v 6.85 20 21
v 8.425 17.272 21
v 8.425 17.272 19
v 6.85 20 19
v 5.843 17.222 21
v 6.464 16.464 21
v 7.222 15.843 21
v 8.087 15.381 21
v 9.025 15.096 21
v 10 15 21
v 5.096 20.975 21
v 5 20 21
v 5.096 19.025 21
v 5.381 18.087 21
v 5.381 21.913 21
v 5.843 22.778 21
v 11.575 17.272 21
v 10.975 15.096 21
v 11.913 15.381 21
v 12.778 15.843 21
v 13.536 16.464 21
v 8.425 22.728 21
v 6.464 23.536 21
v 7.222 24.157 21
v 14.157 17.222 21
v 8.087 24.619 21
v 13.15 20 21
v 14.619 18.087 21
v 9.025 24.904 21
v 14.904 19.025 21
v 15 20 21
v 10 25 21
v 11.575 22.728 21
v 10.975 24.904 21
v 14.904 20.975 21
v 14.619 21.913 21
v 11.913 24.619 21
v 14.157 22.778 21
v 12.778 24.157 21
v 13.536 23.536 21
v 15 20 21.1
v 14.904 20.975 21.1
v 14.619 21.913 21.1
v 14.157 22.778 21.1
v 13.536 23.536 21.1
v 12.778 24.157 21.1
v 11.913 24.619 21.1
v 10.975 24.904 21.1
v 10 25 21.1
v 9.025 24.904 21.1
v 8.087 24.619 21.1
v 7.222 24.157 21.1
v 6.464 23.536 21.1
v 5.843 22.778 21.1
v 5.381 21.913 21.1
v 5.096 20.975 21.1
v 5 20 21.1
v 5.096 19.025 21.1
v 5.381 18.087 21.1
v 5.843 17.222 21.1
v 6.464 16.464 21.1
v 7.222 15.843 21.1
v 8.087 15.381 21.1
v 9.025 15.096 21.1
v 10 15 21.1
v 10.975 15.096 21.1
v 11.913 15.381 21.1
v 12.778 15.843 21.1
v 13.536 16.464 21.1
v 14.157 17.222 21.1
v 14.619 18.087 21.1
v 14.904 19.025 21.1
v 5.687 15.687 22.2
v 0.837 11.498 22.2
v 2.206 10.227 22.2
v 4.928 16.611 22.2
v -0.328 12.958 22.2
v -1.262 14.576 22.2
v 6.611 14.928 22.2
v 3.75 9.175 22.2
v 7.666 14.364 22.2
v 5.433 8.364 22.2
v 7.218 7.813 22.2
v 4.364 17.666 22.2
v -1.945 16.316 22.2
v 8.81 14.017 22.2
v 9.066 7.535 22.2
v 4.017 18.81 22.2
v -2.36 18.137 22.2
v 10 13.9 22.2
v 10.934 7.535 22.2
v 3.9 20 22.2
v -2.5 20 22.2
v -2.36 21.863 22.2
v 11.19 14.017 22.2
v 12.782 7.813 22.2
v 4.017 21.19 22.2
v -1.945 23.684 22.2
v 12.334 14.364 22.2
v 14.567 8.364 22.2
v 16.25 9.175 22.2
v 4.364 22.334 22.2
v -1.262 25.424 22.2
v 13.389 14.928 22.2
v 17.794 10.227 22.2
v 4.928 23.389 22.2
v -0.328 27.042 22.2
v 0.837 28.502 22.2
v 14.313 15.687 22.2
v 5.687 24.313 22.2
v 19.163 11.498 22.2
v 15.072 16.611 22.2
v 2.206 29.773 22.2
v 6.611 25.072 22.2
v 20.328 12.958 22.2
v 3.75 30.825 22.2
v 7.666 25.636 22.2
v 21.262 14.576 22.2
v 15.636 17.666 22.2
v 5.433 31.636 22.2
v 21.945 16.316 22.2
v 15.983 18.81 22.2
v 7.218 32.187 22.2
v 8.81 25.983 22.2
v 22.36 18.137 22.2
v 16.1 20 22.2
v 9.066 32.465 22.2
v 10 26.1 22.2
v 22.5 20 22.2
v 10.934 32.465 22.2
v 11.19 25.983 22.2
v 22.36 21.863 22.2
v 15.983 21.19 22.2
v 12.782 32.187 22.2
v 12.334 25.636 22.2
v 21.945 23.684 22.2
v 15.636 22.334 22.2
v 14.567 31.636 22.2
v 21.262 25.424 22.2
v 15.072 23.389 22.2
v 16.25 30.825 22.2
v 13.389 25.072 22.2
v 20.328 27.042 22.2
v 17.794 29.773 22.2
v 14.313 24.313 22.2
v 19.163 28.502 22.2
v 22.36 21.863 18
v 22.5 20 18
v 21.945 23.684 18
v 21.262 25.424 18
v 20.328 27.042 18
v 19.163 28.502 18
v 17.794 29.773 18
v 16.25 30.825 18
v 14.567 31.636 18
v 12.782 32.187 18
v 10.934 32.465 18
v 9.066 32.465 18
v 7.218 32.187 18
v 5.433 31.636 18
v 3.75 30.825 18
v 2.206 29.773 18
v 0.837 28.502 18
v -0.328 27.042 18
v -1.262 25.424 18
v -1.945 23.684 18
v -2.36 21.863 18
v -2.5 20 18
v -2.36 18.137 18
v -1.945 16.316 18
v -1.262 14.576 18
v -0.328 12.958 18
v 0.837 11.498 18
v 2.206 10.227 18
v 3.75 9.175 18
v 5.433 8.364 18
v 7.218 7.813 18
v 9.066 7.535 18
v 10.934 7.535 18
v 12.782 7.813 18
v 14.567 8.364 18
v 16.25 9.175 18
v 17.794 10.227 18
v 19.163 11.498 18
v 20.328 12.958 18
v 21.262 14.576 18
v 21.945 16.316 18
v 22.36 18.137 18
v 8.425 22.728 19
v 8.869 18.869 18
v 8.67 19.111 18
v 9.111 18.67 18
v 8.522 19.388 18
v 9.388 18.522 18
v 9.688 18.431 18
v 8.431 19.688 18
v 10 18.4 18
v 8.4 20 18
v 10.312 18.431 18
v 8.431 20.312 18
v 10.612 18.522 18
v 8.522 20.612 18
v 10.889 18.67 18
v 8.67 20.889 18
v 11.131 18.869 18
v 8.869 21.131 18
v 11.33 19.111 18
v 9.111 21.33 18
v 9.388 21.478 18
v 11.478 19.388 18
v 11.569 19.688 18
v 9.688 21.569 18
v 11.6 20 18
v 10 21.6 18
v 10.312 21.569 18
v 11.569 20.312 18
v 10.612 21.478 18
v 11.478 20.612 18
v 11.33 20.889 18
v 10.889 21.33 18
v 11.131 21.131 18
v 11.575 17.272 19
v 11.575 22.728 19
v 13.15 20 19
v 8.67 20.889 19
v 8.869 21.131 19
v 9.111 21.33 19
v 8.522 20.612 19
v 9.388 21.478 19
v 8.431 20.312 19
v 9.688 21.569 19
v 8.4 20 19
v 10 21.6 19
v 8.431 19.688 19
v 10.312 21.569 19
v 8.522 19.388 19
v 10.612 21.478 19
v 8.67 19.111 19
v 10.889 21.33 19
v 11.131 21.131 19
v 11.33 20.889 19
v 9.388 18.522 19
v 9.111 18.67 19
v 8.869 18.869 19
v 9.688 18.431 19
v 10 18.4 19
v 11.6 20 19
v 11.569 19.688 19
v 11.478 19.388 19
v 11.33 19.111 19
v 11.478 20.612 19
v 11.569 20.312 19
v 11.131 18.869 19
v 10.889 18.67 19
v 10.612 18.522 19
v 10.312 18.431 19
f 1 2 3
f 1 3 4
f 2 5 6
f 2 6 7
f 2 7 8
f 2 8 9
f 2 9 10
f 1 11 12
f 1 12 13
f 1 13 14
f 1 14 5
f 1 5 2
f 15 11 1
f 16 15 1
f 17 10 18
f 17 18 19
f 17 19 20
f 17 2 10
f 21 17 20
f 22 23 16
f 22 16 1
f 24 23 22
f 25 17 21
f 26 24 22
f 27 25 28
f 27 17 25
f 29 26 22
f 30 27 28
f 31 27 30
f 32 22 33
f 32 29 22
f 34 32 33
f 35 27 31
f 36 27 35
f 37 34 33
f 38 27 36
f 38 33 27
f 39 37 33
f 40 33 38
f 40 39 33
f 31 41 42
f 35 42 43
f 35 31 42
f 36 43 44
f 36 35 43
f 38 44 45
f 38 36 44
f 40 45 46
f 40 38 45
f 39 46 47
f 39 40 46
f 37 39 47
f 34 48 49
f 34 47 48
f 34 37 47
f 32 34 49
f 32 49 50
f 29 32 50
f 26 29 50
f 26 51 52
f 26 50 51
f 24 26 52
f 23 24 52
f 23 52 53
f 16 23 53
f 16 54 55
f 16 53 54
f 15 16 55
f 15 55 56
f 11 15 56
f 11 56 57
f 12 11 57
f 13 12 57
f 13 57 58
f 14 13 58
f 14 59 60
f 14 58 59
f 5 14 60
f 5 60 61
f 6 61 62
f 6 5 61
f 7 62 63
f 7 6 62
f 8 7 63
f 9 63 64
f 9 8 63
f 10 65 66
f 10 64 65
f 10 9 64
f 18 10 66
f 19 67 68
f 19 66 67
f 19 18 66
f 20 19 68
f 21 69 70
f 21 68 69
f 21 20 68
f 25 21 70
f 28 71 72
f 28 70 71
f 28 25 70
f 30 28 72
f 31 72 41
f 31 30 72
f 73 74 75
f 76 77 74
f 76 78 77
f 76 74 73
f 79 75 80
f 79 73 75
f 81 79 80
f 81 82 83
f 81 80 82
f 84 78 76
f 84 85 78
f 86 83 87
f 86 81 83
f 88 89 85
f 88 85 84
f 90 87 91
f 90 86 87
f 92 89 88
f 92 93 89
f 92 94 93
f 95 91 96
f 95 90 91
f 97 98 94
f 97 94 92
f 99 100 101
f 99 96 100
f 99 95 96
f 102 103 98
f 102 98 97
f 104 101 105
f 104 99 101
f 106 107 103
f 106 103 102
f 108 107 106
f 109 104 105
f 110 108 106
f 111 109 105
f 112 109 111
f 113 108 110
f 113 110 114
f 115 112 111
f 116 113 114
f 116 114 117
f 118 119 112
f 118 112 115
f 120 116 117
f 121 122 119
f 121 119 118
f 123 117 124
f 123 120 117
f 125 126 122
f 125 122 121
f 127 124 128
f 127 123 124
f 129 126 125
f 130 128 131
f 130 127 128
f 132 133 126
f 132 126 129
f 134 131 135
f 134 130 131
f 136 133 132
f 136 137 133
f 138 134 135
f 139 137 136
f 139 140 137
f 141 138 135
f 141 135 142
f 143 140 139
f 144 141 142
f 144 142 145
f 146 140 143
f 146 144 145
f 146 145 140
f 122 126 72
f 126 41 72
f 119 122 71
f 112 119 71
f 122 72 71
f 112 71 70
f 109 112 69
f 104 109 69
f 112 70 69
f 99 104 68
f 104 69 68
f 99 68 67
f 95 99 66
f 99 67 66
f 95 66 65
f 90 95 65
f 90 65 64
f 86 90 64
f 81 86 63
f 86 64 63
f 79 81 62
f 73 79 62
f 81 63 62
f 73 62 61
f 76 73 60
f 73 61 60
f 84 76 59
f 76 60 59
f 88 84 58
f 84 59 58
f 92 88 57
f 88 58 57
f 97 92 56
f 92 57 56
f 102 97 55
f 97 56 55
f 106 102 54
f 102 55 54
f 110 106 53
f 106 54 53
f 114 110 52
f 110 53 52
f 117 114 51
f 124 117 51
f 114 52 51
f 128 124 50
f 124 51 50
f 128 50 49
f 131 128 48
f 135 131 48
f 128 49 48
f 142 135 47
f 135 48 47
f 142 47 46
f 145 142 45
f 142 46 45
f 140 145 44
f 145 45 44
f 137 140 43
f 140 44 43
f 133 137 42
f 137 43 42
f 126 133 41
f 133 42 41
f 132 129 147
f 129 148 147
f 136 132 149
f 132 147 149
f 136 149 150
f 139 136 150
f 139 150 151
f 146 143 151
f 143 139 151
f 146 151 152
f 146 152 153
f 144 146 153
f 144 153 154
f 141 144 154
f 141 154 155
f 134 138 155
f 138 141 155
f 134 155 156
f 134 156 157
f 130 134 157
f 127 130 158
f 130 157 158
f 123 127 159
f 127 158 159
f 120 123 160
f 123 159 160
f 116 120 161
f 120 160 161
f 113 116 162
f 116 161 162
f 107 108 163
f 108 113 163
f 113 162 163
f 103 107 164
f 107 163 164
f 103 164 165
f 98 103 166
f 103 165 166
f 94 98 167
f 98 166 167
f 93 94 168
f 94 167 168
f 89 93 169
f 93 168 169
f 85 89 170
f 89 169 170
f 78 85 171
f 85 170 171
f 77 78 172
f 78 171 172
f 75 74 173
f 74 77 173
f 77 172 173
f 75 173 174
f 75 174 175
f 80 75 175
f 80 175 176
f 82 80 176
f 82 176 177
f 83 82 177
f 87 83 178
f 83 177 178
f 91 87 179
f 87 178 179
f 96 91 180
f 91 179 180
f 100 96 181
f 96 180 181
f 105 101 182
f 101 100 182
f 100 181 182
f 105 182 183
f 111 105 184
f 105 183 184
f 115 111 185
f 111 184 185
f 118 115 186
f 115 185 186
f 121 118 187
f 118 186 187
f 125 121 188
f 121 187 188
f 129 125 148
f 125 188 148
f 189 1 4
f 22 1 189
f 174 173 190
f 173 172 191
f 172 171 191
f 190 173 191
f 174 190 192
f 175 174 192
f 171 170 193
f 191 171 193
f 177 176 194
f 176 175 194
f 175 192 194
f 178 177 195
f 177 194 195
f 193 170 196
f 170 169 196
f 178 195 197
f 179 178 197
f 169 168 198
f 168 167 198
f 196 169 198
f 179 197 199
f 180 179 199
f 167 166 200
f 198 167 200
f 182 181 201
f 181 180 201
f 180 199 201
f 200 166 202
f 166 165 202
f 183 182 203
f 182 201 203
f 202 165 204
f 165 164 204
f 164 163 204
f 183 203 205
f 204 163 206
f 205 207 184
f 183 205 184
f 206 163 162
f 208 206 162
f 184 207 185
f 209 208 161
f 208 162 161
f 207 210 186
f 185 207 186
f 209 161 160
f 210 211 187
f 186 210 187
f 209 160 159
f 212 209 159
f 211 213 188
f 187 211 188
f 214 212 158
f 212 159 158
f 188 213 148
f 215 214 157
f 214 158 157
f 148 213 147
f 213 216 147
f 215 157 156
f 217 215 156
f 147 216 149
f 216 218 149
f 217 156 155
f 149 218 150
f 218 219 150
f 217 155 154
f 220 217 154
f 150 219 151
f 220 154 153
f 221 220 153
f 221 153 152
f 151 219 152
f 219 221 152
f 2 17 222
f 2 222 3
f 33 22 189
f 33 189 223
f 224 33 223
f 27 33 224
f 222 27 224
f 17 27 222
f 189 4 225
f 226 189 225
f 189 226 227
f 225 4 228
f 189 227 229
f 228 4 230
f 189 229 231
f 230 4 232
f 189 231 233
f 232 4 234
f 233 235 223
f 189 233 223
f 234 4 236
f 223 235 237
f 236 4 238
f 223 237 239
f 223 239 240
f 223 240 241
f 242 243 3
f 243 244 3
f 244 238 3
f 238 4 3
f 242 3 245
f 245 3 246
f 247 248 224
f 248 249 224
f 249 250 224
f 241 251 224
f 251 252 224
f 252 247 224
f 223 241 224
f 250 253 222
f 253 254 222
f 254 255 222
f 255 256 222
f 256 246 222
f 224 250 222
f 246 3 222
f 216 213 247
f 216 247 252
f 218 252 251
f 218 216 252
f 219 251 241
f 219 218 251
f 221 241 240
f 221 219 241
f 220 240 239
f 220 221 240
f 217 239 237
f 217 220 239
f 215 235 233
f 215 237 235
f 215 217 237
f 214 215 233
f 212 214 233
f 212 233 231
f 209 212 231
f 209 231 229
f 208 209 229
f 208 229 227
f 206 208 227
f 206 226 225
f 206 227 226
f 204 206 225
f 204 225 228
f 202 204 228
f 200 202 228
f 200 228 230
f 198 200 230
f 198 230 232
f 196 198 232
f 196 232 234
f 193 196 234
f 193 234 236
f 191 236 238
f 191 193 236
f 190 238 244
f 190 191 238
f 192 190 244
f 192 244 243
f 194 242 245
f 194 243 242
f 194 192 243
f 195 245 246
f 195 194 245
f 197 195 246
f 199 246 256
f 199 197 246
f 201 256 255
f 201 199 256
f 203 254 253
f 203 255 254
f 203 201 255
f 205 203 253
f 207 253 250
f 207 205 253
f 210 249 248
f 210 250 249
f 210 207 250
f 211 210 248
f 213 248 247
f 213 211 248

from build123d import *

# Parameters (mm, degrees)
BOX031_W          = 40
BOX031_H          = 50
BOX031_DEPTH      = 1.4
CYLINDER070_R     = 5
CYLINDER070_DEPTH = 22.75
CYLINDER069_R     = 1.6
CYLINDER069_DEPTH = 22.75
BOX029_W          = 40
BOX029_H          = 50
BOX029_DEPTH      = 10
BOX030_W          = 40
BOX030_H          = 50
BOX030_DEPTH      = 2.3
CYLINDER067_R     = 12.5
CYLINDER067_DEPTH = 7
BOX028_W          = 40
BOX028_H          = 50
BOX028_DEPTH      = 0.7
CYLINDER066_R     = 4
CYLINDER066_DEPTH = 2.75
CYLINDER064_R     = 1.6
CYLINDER064_DEPTH = 22.75
CYLINDER063_R     = 4
CYLINDER063_DEPTH = 2.75
PRISM009_DEPTH    = 3
CYLINDER065_R     = 12.5
CYLINDER065_DEPTH = 7
CHAMFER001_SIZE   = 2.4


with BuildPart() as cube031:
    # Box031 → Box031 (new body)
    with BuildSketch(Plane(origin=(-10, 0, 22.2), x_dir=(1, 0, 0), z_dir=(0, 0, 1))):
        with Locations((20, 25)):
            Rectangle(BOX031_W, BOX031_H)
    extrude(amount=BOX031_DEPTH)


with BuildPart() as cylinder071:
    # Cylinder070 → Cylinder070 (new body)
    with BuildSketch(Plane(origin=(10, 20, 21), x_dir=(1, 0, 0), z_dir=(0, 0, 1))):
        Circle(CYLINDER070_R)
    extrude(amount=CYLINDER070_DEPTH)


with BuildPart() as cylinder070:
    # Cylinder069 → Cylinder069 (new body)
    with BuildSketch(Plane(origin=(10, 20, 12), x_dir=(1, 0, 0), z_dir=(0, 0, 1))):
        Circle(CYLINDER069_R)
    extrude(amount=CYLINDER069_DEPTH)


with BuildPart() as cube029:
    # Box029 → Box029 (new body)
    with BuildSketch(Plane(origin=(-10, 0, 23.5), x_dir=(1, 0, 0), z_dir=(0, 0, 1))):
        with Locations((20, 25)):
            Rectangle(BOX029_W, BOX029_H)
    extrude(amount=BOX029_DEPTH)


with BuildPart() as cube030:
    # Box030 → Box030 (new body)
    with BuildSketch(Plane(origin=(-10, 0, 15.7), x_dir=(1, 0, 0), z_dir=(0, 0, 1))):
        with Locations((20, 25)):
            Rectangle(BOX030_W, BOX030_H)
    extrude(amount=BOX030_DEPTH)


with BuildPart() as cylinder068:
    # Cylinder067 → Cylinder067 (new body)
    with BuildSketch(Plane(origin=(10, 20, 21.5), x_dir=(1, 0, 0), z_dir=(0, 0, 1))):
        Circle(CYLINDER067_R)
    extrude(amount=CYLINDER067_DEPTH)


with BuildPart() as cube028:
    # Box028 → Box028 (new body)
    with BuildSketch(Plane(origin=(-10, 0, 15), x_dir=(1, 0, 0), z_dir=(0, 0, 1))):
        with Locations((20, 25)):
            Rectangle(BOX028_W, BOX028_H)
    extrude(amount=BOX028_DEPTH)


with BuildPart() as cylinder067:
    # Cylinder066 → Cylinder066 (new body)
    with BuildSketch(Plane(origin=(10, 20, 15.2), x_dir=(1, 0, 0), z_dir=(0, 0, 1))):
        Circle(CYLINDER066_R)
    extrude(amount=CYLINDER066_DEPTH)


with BuildPart() as cylinder063:
    # Cylinder064 → Cylinder064 (new body)
    with BuildSketch(Plane(origin=(10, 0, -31), x_dir=(1, 0, 0), z_dir=(0, 0, 1))):
        Circle(CYLINDER064_R)
    extrude(amount=CYLINDER064_DEPTH)


with BuildPart() as cylinder065:
    # Cylinder063 → Cylinder063 (new body)
    with BuildSketch(Plane(origin=(10, 0, -27), x_dir=(1, 0, 0), z_dir=(0, 0, 1))):
        Circle(CYLINDER063_R)
    extrude(amount=CYLINDER063_DEPTH)


with BuildPart() as prism009:
    # Prism009 → Prism009 (new body)
    with BuildSketch(Plane(origin=(10, 0, -20), x_dir=(1, 0, 0), z_dir=(0, 0, -1))):
        Polygon((3.15, 0), (1.575, 2.72798), (-1.575, 2.72798), (-3.15, 0), (-1.575, -2.72798), (1.575, -2.72798), align=None)
    extrude(amount=PRISM009_DEPTH)


with BuildPart() as plato_tornillo_fino:
    # Cylinder065 → Cylinder065 (new body)
    with BuildSketch(Plane(origin=(10, 0, -27), x_dir=(1, 0, 0), z_dir=(0, 0, 1))):
        Circle(CYLINDER065_R)
    extrude(amount=CYLINDER065_DEPTH)

    # Cut051: cut Prism009
    add(prism009.part, mode=Mode.SUBTRACT)

    # Cut052: cut Cylinder065
    add(cylinder065.part, mode=Mode.SUBTRACT)

    # Cut053: cut Cylinder063
    add(cylinder063.part, mode=Mode.SUBTRACT)


with BuildPart() as plato_tornillo_fino_1:
    # Cut053 placement: moved
    add(plato_tornillo_fino.part.moved(Location((0, 20, 42))))

    # Cut055: cut Cylinder067
    add(cylinder067.part, mode=Mode.SUBTRACT)

    # Cut054: cut Cube028
    add(cube028.part, mode=Mode.SUBTRACT)

    # Fusion024: union Cylinder068
    add(cylinder068.part)

    # Cut056: cut Cube030
    add(cube030.part, mode=Mode.SUBTRACT)

    # Cut057: cut Cube029
    add(cube029.part, mode=Mode.SUBTRACT)

    # Cut058: cut Cylinder070
    add(cylinder070.part, mode=Mode.SUBTRACT)

    # Cut059: cut Cylinder071
    add(cylinder071.part, mode=Mode.SUBTRACT)

    # Chamfer001
    chamfer001_edges = [plato_tornillo_fino_1.edges().sort_by_distance(p)[0] for p in [
        (5, 20, 23.5),
    ]]
    chamfer(chamfer001_edges, length=CHAMFER001_SIZE)

    # Cut060: cut Cube031
    add(cube031.part, mode=Mode.SUBTRACT)


solid = plato_tornillo_fino_1.part
